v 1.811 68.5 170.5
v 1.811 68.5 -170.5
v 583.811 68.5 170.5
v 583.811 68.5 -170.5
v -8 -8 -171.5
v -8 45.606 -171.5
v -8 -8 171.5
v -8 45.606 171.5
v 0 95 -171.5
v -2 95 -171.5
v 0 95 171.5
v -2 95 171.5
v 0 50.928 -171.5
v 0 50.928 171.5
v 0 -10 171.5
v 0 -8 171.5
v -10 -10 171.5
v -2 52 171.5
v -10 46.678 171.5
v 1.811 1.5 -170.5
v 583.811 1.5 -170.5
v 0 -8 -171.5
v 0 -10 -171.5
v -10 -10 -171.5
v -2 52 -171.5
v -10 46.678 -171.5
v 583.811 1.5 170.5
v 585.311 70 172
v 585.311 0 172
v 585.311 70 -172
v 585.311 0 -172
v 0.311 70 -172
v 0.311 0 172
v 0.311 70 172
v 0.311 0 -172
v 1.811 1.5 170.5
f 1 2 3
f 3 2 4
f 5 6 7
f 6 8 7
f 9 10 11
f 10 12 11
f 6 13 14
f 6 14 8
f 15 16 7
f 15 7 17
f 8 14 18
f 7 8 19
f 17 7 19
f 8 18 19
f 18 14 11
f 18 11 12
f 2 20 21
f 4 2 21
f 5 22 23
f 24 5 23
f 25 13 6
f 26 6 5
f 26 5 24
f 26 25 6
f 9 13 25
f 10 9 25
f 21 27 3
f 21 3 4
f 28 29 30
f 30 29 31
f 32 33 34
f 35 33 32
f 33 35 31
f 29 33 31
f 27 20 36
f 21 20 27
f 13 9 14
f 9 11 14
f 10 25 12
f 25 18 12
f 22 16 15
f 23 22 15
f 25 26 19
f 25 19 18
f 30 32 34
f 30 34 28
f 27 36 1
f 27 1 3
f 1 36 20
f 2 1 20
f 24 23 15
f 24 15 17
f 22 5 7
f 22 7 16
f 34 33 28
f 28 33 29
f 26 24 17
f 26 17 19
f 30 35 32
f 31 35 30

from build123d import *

# Parameters (mm, degrees)
EXTRUDE_1_OUTLINE_W     = 585
EXTRUDE_1_OUTLINE_H     = 344
EXTRUDE_1_DEPTH         = 1.5
EXTRUDE_START           = 68.5
EXTRUDE_1_2_OUTLINE_W   = 585
EXTRUDE_1_2_OUTLINE_H   = 344
EXTRUDE_1_2_DEPTH       = 1.5
EXTRUDE_START_2         = 1.5
EXTRUDE_1_3_OUTLINE_W   = 585
EXTRUDE_1_3_OUTLINE_H   = 344
EXTRUDE_1_3_OUTLINE_W_2 = 582
EXTRUDE_1_3_OUTLINE_H_2 = 341
EXTRUDE_1_3_DEPTH       = 67
EXTRUDE_2_DEPTH         = 171.5


# Read off the part's stored shape, not the designer's step: Вытянуть-Тонкостенный1
with BuildPart() as part:
    # Вытянуть-Тонкостенный1 outline → Вытянуть-Тонкостенный1 (new body)
    with BuildSketch(Plane(origin=(0, 0, 0), x_dir=(1, 0, 0), z_dir=(0, 1, 0))):
        with Locations((292.810788, 0)):
            Rectangle(EXTRUDE_1_OUTLINE_W, EXTRUDE_1_OUTLINE_H)
    extrude(amount=EXTRUDE_1_DEPTH)



with BuildPart() as body_2:
    # Extrude 1 2 outline → Extrude 1 2 (new body)
    with BuildSketch(Plane(origin=(0, 0, 0), x_dir=(1, 0, 0), z_dir=(0, 1, 0)).offset(EXTRUDE_START)):
        with Locations((292.810788, 0)):
            Rectangle(EXTRUDE_1_2_OUTLINE_W, EXTRUDE_1_2_OUTLINE_H)
    extrude(amount=EXTRUDE_1_2_DEPTH)


with BuildPart() as part_1:
    add(part.part)

    add(body_2.part)  # Extrude 1 3 merges body 2
    # Extrude 1 3 outline → Extrude 1 3 (add)
    with BuildSketch(Plane(origin=(0, 0, 0), x_dir=(1, 0, 0), z_dir=(0, 1, 0)).offset(EXTRUDE_START_2)):
        with Locations((292.810788, 0)):
            Rectangle(EXTRUDE_1_3_OUTLINE_W, EXTRUDE_1_3_OUTLINE_H)
        with Locations((292.810788, 0)):
            Rectangle(EXTRUDE_1_3_OUTLINE_W_2, EXTRUDE_1_3_OUTLINE_H_2, mode=Mode.SUBTRACT)
    extrude(amount=EXTRUDE_1_3_DEPTH)


with BuildPart() as body_2_2:
    # Эскиз2 → Вытянуть-Тонкостенный2 (new, symmetric)
    with BuildSketch(Plane.XY):
        Polygon((0, -10), (-10, -10), (-10, 46.678122215), (-2, 52), (-2, 95), (0, 95), (0, 50.928356013), (-8, 45.606478228), (-8, -8), (0, -8), align=None)
    extrude(amount=EXTRUDE_2_DEPTH, both=True)


solid = Compound([part_1.part, body_2_2.part])
